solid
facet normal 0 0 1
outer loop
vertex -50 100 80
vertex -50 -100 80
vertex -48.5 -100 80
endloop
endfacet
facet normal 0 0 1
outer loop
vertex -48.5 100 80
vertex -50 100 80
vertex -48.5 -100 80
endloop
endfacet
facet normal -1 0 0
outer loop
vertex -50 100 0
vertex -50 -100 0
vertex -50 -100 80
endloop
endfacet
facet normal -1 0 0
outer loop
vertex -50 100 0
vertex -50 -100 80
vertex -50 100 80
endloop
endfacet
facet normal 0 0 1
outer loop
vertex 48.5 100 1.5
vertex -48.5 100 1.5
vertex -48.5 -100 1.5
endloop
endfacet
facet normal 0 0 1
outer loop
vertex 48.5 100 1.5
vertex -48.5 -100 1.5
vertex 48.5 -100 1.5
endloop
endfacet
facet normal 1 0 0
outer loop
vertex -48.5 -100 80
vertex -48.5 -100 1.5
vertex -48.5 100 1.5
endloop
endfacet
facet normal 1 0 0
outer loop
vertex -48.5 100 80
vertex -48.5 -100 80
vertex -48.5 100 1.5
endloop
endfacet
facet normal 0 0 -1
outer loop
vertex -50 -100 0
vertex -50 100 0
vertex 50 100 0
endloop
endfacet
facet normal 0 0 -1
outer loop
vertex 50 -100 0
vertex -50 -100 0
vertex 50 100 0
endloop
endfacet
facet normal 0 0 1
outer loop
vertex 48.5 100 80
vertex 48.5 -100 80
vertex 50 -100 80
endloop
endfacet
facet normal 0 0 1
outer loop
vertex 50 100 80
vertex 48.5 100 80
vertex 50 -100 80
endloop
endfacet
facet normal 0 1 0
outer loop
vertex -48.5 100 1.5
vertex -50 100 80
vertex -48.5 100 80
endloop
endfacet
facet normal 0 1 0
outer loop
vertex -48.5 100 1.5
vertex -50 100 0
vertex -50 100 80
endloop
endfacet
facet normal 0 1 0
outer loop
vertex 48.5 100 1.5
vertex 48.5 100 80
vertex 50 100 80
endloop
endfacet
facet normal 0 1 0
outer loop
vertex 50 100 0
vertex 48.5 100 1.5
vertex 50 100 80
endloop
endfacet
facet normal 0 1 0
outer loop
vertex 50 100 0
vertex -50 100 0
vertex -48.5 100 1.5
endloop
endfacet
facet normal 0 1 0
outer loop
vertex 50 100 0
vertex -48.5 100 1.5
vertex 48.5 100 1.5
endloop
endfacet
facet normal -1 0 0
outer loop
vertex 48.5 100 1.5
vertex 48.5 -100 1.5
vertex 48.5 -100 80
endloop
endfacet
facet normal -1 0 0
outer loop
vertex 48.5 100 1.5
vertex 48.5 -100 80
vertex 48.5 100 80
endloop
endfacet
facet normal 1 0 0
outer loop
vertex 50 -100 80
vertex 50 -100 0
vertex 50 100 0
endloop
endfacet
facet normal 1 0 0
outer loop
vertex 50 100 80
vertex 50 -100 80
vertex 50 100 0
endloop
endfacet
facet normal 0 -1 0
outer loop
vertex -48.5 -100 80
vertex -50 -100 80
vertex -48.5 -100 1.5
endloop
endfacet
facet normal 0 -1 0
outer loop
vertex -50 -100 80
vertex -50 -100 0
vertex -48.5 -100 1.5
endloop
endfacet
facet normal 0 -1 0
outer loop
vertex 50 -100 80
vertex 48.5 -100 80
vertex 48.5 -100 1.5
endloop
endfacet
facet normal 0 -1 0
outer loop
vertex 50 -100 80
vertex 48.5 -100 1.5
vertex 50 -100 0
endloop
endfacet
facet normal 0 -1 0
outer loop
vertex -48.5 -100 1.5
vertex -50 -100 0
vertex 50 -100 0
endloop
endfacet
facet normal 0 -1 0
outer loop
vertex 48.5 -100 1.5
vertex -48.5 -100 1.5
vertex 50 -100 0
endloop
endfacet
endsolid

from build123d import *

# Parameters (mm, degrees)
SKETCH1_W           = 100
SKETCH1_H           = 200
BOSS_EXTRUDE1_DEPTH = 80
SHELL1_T            = -1.5


with BuildPart() as part:
    # Sketch1 → Boss-Extrude1 (new body)
    with BuildSketch(Plane.XY):
        Rectangle(SKETCH1_W, SKETCH1_H)
    extrude(amount=BOSS_EXTRUDE1_DEPTH)

    # Shell1
    shell1_openings = [part.faces().sort_by_distance(p)[0] for p in [
        (0, 0, 80),
        (0, 100, 40),
        (0, -100, 40),
    ]]
    offset(amount=SHELL1_T, openings=shell1_openings, kind=Kind.INTERSECTION)


solid = part.part
